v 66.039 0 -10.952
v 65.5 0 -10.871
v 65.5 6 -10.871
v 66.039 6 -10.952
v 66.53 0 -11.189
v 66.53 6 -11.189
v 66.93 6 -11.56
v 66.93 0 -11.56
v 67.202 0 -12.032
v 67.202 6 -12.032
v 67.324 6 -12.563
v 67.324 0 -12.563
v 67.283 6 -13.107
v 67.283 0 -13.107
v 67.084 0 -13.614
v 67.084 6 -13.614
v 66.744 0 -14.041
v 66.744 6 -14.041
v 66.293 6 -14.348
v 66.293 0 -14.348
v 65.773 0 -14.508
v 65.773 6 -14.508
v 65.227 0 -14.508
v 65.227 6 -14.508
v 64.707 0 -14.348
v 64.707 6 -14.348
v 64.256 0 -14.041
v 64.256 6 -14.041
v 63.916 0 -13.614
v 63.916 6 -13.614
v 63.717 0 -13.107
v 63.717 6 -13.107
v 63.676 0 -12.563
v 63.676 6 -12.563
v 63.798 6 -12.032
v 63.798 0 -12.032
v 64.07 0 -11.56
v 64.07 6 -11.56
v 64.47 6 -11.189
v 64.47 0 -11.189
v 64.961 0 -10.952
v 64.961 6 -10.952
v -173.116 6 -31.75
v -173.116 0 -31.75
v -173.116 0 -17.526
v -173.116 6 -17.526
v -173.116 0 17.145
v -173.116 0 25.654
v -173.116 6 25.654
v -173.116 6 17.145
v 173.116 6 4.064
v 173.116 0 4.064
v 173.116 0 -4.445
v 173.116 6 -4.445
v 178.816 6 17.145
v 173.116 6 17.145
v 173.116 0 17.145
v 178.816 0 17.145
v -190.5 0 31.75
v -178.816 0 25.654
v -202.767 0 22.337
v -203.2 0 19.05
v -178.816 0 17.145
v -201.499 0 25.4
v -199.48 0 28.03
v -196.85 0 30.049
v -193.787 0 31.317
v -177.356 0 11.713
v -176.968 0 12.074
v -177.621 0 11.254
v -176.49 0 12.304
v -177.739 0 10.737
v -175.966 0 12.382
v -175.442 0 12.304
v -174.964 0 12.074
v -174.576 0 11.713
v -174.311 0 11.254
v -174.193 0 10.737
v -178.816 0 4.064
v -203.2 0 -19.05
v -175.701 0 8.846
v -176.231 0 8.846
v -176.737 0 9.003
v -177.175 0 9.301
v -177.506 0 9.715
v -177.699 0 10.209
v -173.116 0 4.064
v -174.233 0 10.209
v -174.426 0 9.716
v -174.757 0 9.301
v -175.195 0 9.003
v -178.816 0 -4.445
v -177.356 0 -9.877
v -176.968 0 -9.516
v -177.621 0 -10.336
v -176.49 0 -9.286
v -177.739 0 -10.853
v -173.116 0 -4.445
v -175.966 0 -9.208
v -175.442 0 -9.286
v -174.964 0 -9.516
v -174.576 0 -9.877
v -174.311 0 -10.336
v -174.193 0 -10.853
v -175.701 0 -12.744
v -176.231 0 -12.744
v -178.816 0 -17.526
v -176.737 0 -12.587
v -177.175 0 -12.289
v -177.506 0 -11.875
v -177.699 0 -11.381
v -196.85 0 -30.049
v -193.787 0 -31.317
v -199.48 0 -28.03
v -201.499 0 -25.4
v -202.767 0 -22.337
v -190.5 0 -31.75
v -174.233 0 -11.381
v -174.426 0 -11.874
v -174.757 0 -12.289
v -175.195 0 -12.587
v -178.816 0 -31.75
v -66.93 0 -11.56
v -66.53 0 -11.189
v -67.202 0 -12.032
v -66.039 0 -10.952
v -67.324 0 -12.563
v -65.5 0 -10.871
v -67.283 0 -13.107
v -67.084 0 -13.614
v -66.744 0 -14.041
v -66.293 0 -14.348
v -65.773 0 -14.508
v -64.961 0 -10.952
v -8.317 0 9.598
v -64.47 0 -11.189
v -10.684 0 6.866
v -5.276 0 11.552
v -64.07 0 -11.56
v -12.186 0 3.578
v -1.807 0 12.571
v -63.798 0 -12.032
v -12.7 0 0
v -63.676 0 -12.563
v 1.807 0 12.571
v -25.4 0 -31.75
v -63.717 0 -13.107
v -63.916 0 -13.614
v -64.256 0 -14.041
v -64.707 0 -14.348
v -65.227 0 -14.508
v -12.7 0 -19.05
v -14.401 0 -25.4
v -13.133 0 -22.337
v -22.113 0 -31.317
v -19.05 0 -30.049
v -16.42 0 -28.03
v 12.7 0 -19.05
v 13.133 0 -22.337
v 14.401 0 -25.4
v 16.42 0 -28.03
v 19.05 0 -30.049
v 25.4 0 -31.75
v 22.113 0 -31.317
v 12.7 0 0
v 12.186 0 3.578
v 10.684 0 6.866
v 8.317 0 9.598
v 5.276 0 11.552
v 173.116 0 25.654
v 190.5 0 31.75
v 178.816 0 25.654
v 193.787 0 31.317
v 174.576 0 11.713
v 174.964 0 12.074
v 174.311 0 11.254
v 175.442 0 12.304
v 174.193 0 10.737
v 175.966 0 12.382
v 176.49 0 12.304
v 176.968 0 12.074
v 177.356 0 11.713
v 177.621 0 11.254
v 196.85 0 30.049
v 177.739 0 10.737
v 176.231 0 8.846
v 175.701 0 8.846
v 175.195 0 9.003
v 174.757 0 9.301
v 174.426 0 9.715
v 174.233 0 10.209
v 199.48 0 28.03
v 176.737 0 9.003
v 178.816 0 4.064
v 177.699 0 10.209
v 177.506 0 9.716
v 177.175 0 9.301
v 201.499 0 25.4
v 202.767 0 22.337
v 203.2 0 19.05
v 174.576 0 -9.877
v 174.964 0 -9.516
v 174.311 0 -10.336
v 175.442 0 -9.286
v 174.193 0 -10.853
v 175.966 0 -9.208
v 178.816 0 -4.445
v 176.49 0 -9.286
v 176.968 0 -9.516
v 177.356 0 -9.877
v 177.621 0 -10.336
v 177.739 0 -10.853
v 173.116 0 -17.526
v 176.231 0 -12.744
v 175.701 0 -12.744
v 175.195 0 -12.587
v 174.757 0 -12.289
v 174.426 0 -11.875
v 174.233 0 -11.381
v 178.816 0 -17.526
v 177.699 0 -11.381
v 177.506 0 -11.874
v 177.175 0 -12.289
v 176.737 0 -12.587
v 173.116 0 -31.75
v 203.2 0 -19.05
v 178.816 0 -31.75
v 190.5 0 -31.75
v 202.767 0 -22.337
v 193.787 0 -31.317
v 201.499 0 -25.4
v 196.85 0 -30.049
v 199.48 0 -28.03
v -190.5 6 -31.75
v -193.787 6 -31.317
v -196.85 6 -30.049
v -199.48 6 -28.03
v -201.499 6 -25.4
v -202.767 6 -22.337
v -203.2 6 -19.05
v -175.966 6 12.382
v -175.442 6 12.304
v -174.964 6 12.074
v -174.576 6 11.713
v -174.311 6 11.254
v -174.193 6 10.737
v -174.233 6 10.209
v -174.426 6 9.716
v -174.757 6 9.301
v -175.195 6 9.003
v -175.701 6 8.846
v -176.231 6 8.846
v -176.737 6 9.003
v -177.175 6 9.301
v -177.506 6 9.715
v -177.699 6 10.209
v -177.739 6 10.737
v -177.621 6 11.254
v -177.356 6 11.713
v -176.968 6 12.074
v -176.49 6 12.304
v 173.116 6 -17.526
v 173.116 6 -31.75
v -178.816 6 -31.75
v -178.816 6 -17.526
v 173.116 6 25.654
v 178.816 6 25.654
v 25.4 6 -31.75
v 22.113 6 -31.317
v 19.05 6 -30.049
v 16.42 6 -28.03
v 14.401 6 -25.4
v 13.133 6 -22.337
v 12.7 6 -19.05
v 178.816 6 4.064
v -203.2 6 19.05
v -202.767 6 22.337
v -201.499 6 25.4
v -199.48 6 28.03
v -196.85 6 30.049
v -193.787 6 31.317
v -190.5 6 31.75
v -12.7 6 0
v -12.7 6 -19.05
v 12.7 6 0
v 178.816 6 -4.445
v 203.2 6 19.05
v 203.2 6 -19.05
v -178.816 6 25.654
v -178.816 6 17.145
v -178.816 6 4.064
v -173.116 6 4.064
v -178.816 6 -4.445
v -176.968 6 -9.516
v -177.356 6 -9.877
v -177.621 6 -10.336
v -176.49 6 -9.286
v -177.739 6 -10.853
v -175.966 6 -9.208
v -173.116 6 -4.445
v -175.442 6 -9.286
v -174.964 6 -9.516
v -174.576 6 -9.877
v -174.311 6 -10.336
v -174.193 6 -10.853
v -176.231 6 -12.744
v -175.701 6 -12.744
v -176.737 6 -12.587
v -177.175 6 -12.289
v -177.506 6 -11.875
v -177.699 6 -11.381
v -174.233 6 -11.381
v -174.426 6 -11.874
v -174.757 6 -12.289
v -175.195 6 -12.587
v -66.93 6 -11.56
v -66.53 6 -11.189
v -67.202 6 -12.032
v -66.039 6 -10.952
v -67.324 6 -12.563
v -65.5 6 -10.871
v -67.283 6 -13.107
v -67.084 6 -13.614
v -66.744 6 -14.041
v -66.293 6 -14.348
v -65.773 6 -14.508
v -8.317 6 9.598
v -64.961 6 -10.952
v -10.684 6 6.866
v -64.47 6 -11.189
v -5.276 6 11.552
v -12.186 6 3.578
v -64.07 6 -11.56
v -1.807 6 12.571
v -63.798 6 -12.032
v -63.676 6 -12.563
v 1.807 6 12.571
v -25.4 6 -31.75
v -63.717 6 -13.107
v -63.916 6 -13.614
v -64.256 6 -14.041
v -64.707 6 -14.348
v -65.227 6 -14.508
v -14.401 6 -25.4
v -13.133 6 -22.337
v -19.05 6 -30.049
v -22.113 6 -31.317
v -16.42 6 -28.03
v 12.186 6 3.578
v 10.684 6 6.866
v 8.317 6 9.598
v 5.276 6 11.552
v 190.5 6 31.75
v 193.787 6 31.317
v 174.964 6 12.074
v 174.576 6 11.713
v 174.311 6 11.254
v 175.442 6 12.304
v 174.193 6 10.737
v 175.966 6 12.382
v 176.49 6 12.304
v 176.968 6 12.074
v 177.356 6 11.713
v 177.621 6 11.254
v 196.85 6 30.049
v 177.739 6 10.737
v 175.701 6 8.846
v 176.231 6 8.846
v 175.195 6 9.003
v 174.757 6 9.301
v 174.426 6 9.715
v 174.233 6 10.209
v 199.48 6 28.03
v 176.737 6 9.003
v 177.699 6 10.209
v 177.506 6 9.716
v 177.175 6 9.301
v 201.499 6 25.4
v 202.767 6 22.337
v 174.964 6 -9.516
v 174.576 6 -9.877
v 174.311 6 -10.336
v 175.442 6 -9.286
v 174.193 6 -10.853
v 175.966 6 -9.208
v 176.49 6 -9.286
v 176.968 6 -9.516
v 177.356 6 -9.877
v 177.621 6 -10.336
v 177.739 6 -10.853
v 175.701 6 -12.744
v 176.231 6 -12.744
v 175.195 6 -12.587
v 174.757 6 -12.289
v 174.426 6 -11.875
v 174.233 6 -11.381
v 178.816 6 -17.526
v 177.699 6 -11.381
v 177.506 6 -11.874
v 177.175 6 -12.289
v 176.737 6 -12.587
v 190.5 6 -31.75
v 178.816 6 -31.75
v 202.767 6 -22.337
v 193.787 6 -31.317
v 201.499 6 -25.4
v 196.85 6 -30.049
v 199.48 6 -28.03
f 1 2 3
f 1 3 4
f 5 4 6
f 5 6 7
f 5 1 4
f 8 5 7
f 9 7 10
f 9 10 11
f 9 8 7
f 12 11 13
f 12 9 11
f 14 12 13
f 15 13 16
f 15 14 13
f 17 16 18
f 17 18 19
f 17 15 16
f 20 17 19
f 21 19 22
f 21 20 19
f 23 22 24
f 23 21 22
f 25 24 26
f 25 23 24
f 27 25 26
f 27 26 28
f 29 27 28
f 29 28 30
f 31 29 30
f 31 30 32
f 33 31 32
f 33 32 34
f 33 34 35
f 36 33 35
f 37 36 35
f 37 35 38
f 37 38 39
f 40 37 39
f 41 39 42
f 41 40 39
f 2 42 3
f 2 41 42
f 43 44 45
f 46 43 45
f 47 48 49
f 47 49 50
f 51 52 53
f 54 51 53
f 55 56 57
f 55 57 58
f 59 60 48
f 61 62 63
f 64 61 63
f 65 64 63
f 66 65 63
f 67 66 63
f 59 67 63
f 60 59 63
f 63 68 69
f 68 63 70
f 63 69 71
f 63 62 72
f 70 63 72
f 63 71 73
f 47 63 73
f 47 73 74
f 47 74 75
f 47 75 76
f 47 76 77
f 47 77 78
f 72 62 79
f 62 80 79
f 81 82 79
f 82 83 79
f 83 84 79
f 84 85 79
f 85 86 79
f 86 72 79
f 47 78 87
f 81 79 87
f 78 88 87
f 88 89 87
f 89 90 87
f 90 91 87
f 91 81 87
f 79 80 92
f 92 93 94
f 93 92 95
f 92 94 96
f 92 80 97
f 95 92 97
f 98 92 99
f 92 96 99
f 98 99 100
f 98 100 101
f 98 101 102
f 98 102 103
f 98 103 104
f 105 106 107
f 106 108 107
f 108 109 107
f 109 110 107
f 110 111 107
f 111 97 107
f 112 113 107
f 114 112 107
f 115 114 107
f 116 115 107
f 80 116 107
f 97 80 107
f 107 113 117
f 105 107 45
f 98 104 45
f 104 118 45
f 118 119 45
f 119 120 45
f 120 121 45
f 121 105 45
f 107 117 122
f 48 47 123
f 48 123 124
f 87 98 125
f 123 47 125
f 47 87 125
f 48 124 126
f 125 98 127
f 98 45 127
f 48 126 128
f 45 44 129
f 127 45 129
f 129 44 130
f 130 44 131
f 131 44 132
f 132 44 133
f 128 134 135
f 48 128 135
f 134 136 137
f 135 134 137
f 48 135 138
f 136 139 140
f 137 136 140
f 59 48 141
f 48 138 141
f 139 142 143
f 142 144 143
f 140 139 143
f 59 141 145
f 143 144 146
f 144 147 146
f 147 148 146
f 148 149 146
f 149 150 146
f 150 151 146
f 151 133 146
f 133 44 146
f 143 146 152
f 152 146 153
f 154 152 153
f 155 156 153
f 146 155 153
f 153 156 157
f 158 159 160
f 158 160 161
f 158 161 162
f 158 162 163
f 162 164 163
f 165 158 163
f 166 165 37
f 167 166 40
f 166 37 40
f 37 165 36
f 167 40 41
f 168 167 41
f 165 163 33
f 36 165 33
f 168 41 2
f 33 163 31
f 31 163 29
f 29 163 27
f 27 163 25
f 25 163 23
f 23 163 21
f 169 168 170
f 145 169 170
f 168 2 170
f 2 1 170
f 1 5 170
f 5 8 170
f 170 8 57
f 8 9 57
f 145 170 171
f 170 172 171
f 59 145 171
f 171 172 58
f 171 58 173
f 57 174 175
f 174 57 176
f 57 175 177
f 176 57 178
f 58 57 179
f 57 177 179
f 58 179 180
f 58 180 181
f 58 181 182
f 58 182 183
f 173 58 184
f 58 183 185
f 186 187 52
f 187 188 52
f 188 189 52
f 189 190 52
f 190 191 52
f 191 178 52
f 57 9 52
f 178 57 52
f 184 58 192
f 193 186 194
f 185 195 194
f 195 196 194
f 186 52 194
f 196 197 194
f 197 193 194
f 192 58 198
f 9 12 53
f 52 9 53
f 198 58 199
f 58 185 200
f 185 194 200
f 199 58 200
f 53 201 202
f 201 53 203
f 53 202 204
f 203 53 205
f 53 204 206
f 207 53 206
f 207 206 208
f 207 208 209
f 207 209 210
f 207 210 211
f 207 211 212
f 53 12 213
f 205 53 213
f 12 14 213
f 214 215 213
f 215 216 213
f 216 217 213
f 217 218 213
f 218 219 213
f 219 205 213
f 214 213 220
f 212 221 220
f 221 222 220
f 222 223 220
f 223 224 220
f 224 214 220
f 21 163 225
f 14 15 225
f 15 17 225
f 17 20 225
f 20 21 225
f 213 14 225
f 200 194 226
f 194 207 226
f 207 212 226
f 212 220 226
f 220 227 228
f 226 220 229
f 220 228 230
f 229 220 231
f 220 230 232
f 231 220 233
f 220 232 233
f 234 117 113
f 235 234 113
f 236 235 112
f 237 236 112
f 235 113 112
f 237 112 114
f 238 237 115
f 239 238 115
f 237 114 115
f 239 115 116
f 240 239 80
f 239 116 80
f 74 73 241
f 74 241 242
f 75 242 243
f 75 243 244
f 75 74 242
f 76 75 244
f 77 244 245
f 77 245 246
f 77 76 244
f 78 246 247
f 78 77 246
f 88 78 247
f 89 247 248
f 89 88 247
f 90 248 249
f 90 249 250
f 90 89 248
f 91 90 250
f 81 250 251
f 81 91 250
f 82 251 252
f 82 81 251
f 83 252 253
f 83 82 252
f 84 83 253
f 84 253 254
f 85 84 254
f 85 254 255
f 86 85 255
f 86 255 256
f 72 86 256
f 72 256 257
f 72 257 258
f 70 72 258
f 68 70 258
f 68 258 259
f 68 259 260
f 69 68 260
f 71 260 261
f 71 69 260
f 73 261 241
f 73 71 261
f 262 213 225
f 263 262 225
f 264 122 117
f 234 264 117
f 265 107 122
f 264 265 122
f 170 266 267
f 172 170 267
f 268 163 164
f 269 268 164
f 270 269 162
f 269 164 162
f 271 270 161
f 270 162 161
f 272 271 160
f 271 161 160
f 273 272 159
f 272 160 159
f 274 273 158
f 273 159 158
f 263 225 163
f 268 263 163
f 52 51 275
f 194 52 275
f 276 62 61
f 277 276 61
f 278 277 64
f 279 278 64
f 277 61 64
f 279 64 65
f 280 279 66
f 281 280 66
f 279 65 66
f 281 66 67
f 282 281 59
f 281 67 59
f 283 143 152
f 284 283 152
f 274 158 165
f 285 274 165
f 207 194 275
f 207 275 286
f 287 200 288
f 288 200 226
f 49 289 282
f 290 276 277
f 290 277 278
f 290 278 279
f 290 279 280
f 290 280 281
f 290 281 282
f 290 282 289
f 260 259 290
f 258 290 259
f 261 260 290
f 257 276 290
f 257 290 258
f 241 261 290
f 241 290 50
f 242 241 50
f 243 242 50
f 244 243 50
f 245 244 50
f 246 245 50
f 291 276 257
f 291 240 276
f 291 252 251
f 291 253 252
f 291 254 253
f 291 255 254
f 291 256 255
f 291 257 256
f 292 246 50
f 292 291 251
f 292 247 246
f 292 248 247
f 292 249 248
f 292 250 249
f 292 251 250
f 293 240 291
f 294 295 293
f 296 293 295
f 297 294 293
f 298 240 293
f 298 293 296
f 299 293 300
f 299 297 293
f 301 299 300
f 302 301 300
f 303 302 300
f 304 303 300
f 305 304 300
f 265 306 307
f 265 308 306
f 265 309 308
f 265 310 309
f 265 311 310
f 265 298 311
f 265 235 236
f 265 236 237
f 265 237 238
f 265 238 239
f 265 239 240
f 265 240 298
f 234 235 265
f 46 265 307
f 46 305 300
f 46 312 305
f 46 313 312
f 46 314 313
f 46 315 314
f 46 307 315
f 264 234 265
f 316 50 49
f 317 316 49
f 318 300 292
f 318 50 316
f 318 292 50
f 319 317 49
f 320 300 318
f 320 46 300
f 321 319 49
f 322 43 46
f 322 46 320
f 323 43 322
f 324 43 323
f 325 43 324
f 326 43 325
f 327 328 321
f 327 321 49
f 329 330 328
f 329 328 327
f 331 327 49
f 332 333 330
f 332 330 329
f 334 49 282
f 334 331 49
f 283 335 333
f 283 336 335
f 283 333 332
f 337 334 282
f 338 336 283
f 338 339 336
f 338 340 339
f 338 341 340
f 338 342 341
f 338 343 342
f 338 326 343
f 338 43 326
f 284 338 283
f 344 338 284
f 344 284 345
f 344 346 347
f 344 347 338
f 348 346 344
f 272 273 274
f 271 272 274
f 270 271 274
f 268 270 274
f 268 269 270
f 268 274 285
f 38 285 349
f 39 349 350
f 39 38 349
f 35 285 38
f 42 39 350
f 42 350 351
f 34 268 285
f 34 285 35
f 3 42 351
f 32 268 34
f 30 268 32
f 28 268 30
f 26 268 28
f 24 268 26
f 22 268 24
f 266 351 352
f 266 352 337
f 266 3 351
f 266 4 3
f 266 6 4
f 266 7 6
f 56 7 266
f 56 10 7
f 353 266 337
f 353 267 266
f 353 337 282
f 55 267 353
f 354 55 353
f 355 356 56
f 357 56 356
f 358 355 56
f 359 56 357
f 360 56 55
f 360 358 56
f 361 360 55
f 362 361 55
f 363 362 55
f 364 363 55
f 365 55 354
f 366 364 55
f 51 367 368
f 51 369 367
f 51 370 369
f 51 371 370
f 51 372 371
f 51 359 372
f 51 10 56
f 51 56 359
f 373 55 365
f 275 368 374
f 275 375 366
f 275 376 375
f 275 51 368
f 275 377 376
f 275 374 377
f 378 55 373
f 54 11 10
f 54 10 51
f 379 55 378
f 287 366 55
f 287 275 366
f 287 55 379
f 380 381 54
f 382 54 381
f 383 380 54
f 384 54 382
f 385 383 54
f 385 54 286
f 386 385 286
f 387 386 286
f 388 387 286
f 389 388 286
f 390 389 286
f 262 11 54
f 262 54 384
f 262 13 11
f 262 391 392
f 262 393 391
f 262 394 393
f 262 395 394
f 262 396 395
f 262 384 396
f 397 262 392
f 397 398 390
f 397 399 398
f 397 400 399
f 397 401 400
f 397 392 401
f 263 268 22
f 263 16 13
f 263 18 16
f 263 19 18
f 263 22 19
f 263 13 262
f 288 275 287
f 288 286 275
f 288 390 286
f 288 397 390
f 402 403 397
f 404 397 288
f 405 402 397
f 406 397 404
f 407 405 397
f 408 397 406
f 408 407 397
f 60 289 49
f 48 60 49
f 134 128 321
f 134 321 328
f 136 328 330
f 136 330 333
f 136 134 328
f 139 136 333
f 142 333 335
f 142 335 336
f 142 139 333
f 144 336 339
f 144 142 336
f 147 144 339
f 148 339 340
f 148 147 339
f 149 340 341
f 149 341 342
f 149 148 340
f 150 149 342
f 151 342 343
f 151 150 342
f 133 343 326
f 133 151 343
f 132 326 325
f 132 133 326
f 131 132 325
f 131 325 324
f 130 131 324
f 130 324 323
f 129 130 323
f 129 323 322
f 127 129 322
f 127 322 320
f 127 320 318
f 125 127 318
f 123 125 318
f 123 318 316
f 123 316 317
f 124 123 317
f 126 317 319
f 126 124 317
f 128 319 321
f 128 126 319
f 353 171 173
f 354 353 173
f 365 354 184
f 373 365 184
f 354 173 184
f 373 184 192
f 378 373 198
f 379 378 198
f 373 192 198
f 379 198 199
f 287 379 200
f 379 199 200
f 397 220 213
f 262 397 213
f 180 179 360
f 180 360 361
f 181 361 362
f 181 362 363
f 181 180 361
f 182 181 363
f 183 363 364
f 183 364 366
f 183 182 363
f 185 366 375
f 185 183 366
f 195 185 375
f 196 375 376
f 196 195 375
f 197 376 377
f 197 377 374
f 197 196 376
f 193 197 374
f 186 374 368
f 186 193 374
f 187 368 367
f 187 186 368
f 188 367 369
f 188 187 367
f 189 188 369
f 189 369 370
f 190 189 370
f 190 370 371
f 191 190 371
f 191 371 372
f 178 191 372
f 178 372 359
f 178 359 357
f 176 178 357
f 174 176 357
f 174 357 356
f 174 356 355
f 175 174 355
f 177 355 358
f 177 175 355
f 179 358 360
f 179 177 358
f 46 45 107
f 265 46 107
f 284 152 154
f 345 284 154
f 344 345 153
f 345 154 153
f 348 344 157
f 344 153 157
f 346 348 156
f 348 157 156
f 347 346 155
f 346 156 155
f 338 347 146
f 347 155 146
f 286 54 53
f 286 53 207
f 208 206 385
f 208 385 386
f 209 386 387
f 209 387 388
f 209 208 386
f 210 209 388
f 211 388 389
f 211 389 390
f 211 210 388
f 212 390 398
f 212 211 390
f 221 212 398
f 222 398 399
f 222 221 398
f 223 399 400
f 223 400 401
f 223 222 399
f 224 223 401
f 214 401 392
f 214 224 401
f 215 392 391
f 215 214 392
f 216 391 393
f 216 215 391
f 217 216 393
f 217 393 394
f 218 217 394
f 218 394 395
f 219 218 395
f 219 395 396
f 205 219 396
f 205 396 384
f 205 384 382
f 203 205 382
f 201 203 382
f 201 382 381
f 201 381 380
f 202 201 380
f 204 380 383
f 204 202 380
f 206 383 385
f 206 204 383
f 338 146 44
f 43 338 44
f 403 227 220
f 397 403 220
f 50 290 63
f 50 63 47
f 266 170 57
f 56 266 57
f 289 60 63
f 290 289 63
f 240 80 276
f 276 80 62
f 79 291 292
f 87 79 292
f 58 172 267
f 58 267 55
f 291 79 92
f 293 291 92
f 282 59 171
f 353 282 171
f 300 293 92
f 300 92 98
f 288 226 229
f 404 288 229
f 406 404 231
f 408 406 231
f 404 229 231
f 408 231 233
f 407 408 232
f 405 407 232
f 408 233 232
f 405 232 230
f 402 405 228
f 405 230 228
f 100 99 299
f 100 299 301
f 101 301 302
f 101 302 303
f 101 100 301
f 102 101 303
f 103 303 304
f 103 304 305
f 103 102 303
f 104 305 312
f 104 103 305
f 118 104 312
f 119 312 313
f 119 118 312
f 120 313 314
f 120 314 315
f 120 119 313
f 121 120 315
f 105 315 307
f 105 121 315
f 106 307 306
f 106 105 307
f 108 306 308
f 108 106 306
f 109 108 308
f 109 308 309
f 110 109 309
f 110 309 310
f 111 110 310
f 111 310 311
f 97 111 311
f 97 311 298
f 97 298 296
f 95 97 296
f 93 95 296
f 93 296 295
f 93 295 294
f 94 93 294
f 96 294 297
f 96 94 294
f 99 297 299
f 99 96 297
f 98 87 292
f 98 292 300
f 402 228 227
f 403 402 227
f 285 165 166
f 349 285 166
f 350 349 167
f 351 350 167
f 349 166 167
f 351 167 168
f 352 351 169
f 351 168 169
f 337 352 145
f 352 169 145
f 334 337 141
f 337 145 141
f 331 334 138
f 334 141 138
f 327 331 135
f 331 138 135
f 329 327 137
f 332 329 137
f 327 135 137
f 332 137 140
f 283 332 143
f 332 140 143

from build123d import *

# Parameters (mm, degrees)
SKETCH1_W           = 5.7
SKETCH1_H           = 8.509
SKETCH1_R           = 1.778
SKETCH1_R_2         = 1.8288
BOSS_EXTRUDE1_DEPTH = 6


with BuildPart() as part:
    # Sketch1 → Boss-Extrude1 (new body)
    with BuildSketch(Plane(origin=(0, 0, 0), x_dir=(1, 0, 0), z_dir=(0, 1, 0))):
        with BuildLine():
            ThreePointArc((-203.2, -19.05), (-199.480256121, -28.030256121), (-190.5, -31.75))
            Line((-190.5, -31.75), (190.5, -31.75))
            ThreePointArc((190.5, -31.75), (199.480256121, -28.030256121), (203.2, -19.05))
            Line((203.2, -19.05), (203.2, 19.05))
            ThreePointArc((203.2, 19.05), (199.480256121, 28.030256121), (190.5, 31.75))
            Line((190.5, 31.75), (178.816, 31.75))
            Line((178.816, 31.75), (178.816, 26.035))
            Line((178.816, 26.035), (178.816, 17.526))
            Line((178.816, 17.526), (173.116, 17.526))
            Line((173.116, 17.526), (173.116, 26.035))
            Line((173.116, 26.035), (173.116, 31.75))
            Line((173.116, 31.75), (25.4, 31.75))
            ThreePointArc((25.4, 31.75), (16.419743879, 28.030256121), (12.7, 19.05))
            Line((12.7, 19.05), (12.7, 0))
            ThreePointArc((12.7, 0), (0, -12.7), (-12.7, 0))
            Line((-12.7, 0), (-12.7, 19.05))
            ThreePointArc((-12.7, 19.05), (-16.419743879, 28.030256121), (-25.4, 31.75))
            Line((-25.4, 31.75), (-173.116, 31.75))
            Line((-173.116, 31.75), (-173.116, 26.035))
            Line((-173.116, 26.035), (-173.116, 17.526))
            Line((-173.116, 17.526), (-178.816, 17.526))
            Line((-178.816, 17.526), (-178.816, 26.035))
            Line((-178.816, 26.035), (-178.816, 31.75))
            Line((-178.816, 31.75), (-190.5, 31.75))
            ThreePointArc((-190.5, 31.75), (-199.480256121, 28.030256121), (-203.2, 19.05))
            Line((-203.2, 19.05), (-203.2, -19.05))
        make_face()
        with Locations((-175.966, -21.3995)):
            Rectangle(SKETCH1_W, SKETCH1_H, mode=Mode.SUBTRACT)
        with Locations(Location((-175.966, -10.6045, 0), (0, 0, 270))):
            Circle(SKETCH1_R, mode=Mode.SUBTRACT)
        with Locations((175.966, -21.3995)):
            Rectangle(SKETCH1_W, SKETCH1_H, mode=Mode.SUBTRACT)
        with Locations(Location((175.966, -10.6045, 0), (0, 0, 270))):
            Circle(SKETCH1_R, mode=Mode.SUBTRACT)
        with Locations((-175.966, 0.1905)):
            Rectangle(SKETCH1_W, SKETCH1_H, mode=Mode.SUBTRACT)
        with Locations(Location((-175.966, 10.9855, 0), (0, 0, 270))):
            Circle(SKETCH1_R, mode=Mode.SUBTRACT)
        with Locations(Location((-65.5, 12.7, 0), (0, 0, 270))):
            Circle(SKETCH1_R_2, mode=Mode.SUBTRACT)
        with Locations(Location((65.5, 12.7, 0), (0, 0, 270))):
            Circle(SKETCH1_R_2, mode=Mode.SUBTRACT)
        with Locations((175.966, 0.1905)):
            Rectangle(SKETCH1_W, SKETCH1_H, mode=Mode.SUBTRACT)
        with Locations(Location((175.966, 10.9855, 0), (0, 0, 270))):
            Circle(SKETCH1_R, mode=Mode.SUBTRACT)
    extrude(amount=BOSS_EXTRUDE1_DEPTH)


solid = part.part
